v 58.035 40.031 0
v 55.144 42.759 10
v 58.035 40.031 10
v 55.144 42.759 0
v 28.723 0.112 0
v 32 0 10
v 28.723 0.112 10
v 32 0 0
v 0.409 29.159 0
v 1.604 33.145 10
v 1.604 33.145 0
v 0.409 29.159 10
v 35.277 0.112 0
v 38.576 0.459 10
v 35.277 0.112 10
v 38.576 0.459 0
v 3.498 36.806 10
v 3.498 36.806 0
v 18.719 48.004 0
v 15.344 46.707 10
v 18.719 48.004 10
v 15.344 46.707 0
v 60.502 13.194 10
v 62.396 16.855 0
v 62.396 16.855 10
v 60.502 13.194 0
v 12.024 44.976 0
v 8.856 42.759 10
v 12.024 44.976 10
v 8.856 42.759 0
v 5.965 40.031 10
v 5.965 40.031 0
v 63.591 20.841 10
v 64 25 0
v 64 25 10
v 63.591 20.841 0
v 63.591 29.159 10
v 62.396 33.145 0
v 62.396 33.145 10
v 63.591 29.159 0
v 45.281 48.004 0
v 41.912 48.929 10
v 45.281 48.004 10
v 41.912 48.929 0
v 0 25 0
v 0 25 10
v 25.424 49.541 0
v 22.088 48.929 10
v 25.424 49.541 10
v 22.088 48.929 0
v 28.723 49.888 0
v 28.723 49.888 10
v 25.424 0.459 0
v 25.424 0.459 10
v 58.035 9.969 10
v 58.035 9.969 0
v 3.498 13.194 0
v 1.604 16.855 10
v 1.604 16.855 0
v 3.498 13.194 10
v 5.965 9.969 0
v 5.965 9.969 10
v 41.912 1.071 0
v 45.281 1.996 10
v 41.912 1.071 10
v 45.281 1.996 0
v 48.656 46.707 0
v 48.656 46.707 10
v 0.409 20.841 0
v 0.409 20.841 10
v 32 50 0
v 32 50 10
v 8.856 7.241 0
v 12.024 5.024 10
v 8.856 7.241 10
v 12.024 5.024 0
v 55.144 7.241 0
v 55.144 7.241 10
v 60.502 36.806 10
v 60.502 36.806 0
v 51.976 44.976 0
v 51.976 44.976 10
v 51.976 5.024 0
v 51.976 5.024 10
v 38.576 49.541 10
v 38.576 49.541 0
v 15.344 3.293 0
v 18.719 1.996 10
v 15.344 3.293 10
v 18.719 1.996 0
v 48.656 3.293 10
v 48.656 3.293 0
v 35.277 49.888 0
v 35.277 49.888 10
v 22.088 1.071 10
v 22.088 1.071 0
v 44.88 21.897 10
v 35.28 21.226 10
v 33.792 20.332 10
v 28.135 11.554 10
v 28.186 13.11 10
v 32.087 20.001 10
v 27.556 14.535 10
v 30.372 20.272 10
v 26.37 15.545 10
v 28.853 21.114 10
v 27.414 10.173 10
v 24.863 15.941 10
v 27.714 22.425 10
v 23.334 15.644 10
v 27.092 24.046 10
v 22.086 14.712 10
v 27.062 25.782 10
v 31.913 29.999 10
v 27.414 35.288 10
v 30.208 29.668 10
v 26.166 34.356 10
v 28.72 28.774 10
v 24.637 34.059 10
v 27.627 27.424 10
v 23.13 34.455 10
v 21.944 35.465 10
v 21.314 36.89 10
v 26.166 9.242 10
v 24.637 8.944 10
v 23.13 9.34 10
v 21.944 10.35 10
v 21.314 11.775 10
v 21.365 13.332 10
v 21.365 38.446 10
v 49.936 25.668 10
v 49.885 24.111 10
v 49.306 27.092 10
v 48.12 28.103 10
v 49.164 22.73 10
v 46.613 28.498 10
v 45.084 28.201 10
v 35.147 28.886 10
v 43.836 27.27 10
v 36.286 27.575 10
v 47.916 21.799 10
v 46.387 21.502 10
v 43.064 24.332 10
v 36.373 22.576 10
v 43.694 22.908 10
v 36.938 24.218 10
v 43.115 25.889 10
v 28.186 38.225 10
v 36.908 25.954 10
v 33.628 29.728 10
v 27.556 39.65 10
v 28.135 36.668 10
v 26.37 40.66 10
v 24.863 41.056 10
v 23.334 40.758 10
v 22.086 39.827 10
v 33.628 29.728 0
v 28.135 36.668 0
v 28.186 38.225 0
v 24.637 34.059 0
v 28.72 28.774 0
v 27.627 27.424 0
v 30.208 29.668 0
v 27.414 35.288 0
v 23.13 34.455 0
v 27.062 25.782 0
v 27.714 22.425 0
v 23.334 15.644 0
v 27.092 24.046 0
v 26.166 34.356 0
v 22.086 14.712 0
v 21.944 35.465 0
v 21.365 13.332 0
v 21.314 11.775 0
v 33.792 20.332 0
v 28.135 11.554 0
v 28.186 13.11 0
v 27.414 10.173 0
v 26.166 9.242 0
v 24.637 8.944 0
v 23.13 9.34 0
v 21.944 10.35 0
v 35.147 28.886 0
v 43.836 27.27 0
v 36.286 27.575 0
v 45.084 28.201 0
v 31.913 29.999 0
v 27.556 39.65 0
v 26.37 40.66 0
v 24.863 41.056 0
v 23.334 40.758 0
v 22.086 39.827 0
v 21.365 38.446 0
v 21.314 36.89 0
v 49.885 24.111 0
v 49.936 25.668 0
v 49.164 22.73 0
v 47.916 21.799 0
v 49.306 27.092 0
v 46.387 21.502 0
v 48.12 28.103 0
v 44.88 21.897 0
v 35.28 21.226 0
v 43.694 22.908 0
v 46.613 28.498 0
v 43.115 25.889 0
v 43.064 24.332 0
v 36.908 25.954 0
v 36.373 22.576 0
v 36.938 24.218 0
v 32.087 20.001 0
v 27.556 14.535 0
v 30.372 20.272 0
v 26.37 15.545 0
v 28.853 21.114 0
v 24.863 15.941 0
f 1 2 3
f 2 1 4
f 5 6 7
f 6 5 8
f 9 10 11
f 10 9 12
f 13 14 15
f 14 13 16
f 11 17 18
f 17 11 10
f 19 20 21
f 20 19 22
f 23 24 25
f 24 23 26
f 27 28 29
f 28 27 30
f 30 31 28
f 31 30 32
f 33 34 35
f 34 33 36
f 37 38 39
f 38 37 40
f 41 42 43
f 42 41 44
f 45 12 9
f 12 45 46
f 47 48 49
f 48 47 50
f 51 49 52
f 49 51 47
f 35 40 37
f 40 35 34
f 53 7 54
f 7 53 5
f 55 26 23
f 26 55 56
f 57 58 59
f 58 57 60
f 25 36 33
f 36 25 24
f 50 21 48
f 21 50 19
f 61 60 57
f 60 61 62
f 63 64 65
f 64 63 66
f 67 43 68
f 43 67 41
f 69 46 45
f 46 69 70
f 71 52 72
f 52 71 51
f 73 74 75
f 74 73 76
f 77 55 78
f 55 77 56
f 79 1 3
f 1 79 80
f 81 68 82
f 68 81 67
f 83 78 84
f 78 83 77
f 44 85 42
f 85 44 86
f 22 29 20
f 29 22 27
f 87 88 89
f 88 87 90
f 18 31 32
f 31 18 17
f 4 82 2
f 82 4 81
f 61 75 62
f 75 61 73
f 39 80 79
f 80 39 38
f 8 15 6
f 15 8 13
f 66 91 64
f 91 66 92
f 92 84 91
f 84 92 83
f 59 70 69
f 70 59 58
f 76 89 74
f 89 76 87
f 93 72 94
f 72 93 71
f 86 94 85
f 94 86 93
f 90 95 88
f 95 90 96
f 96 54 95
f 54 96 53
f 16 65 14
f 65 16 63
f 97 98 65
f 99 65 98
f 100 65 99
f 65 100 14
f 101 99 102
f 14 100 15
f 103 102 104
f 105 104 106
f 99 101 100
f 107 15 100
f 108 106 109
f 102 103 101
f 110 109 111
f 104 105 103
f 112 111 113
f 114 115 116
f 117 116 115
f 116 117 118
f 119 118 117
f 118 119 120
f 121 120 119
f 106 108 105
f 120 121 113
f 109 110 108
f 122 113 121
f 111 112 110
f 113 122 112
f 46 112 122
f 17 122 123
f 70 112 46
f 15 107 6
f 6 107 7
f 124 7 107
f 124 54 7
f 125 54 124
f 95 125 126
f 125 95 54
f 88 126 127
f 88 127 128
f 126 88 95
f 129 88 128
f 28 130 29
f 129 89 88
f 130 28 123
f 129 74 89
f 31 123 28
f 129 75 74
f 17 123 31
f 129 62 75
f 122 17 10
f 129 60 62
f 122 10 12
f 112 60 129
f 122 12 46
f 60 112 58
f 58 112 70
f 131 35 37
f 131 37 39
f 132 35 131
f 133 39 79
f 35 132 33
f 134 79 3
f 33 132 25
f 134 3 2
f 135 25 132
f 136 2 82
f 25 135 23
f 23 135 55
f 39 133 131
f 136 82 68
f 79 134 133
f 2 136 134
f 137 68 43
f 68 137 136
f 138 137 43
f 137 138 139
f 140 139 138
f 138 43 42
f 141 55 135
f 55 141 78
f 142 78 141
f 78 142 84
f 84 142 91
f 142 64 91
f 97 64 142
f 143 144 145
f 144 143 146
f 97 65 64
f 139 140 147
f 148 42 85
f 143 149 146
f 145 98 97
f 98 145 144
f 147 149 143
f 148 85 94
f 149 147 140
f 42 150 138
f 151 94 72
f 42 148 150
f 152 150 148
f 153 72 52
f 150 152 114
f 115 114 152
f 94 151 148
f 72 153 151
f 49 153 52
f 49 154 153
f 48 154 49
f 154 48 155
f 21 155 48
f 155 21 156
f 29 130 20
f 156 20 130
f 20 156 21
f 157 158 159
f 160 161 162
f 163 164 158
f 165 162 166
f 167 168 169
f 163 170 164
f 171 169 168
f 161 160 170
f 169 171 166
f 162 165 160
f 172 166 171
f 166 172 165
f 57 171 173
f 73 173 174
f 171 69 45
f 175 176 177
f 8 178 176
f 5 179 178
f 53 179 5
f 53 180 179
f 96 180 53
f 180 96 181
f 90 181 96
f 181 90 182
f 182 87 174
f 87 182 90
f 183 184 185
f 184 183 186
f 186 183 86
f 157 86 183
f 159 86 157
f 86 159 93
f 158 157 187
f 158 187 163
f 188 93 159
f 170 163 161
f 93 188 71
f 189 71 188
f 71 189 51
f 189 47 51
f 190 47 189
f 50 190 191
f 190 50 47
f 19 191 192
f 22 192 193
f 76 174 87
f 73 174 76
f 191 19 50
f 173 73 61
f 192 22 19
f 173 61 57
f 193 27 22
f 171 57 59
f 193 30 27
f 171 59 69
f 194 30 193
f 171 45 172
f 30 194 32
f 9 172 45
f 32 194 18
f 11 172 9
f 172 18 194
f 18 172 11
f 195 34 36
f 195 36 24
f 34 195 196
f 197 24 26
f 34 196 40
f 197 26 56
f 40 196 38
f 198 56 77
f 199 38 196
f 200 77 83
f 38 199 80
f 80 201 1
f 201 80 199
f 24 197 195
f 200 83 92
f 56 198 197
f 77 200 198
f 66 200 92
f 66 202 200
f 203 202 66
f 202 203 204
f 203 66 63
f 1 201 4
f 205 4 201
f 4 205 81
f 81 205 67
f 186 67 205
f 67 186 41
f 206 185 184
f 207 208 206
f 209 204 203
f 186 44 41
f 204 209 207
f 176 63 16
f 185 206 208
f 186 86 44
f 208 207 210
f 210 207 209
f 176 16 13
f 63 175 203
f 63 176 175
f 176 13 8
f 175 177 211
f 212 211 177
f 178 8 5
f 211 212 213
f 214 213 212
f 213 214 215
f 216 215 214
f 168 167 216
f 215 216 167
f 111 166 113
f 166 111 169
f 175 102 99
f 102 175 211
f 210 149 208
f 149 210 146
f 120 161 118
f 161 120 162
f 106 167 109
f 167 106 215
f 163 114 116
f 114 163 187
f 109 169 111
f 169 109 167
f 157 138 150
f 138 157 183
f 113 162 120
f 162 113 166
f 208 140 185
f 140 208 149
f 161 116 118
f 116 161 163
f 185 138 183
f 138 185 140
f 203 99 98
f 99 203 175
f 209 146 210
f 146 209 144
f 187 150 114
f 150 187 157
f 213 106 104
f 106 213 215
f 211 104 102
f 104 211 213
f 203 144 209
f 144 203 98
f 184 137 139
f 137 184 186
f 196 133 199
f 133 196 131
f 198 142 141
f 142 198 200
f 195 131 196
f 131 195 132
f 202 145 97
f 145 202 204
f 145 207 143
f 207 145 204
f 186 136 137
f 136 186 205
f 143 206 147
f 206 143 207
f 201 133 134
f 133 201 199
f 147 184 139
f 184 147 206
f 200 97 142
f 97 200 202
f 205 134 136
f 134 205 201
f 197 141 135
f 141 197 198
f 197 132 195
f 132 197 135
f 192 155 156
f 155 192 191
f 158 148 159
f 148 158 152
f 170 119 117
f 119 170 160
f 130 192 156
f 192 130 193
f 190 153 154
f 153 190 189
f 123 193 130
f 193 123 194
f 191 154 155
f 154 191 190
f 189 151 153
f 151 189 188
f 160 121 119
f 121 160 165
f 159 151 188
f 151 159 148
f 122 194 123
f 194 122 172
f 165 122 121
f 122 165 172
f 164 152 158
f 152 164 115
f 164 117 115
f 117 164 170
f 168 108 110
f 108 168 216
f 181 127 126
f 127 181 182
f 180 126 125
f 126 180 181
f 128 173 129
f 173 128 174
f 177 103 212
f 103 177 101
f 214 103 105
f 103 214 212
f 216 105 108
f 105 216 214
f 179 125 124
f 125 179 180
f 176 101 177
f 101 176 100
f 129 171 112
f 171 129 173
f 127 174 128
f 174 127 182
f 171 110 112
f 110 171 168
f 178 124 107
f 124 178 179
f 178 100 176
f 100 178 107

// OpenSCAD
$fn = 32;

// ----------------------------------------------------------------------
// Cam plate: double_lobe cam, base R24
// ----------------------------------------------------------------------

// --- parameters (mm) ---
base_r = 24;              // base circle radius
lobe_h = 8;               // cam lobe rise
bore_r = 5;               // shaft bore radius
plate_t = 10;             // plate thickness, Z (extrusion height)
ring_r = 14.5;            // lightening ring radius
bolt_r = 3.5;             // lightening hole radius

profile = [[64, 25], [63.591, 29.159], [62.396, 33.145], [60.502, 36.806], [58.035, 40.031], [55.144, 42.759], [51.976, 44.976], [48.656, 46.707], [45.281, 48.004], [41.912, 48.929], [38.576, 49.541], [35.277, 49.888], [32, 50], [28.723, 49.888], [25.424, 49.541], [22.088, 48.929], [18.719, 48.004], [15.344, 46.707], [12.024, 44.976], [8.856, 42.759], [5.965, 40.031], [3.498, 36.806], [1.604, 33.145], [0.409, 29.159], [0, 25], [0.409, 20.841], [1.604, 16.855], [3.498, 13.194], [5.965, 9.969], [8.856, 7.241], [12.024, 5.024], [15.344, 3.293], [18.719, 1.996], [22.088, 1.071], [25.424, 0.459], [28.723, 0.112], [32, 0], [35.277, 0.112], [38.576, 0.459], [41.912, 1.071], [45.281, 1.996], [48.656, 3.293], [51.976, 5.024], [55.144, 7.241], [58.035, 9.969], [60.502, 13.194], [62.396, 16.855], [63.591, 20.841]];  // primary outline, 48 points, counter clockwise
void_1 = [[36.908, 25.954], [36.286, 27.575], [35.147, 28.886], [33.628, 29.728], [31.913, 29.999], [30.208, 29.668], [28.72, 28.774], [27.627, 27.424], [27.062, 25.782], [27.092, 24.046], [27.714, 22.425], [28.853, 21.114], [30.372, 20.272], [32.087, 20.001], [33.792, 20.332], [35.28, 21.226], [36.373, 22.576], [36.938, 24.218]];  // shaft bore, 18 points
void_2 = [[49.936, 25.668], [49.306, 27.092], [48.12, 28.103], [46.613, 28.498], [45.084, 28.201], [43.836, 27.27], [43.115, 25.889], [43.064, 24.332], [43.694, 22.908], [44.88, 21.897], [46.387, 21.502], [47.916, 21.799], [49.164, 22.73], [49.885, 24.111]];  // lightening hole 1, 14 points
void_3 = [[28.186, 38.225], [27.556, 39.65], [26.37, 40.66], [24.863, 41.056], [23.334, 40.758], [22.086, 39.827], [21.365, 38.446], [21.314, 36.89], [21.944, 35.465], [23.13, 34.455], [24.637, 34.059], [26.166, 34.356], [27.414, 35.288], [28.135, 36.668]];  // lightening hole 2, 14 points
void_4 = [[28.186, 13.11], [27.556, 14.535], [26.37, 15.545], [24.863, 15.941], [23.334, 15.644], [22.086, 14.712], [21.365, 13.332], [21.314, 11.775], [21.944, 10.35], [23.13, 9.34], [24.637, 8.944], [26.166, 9.242], [27.414, 10.173], [28.135, 11.554]];  // lightening hole 3, 14 points

// --- the one profile operation ---
difference() {
  linear_extrude(height = plate_t) polygon(points = profile);
  translate([0, 0, -1])
    linear_extrude(height = plate_t + 2) polygon(points = void_1);
  translate([0, 0, -1])
    linear_extrude(height = plate_t + 2) polygon(points = void_2);
  translate([0, 0, -1])
    linear_extrude(height = plate_t + 2) polygon(points = void_3);
  translate([0, 0, -1])
    linear_extrude(height = plate_t + 2) polygon(points = void_4);
}
